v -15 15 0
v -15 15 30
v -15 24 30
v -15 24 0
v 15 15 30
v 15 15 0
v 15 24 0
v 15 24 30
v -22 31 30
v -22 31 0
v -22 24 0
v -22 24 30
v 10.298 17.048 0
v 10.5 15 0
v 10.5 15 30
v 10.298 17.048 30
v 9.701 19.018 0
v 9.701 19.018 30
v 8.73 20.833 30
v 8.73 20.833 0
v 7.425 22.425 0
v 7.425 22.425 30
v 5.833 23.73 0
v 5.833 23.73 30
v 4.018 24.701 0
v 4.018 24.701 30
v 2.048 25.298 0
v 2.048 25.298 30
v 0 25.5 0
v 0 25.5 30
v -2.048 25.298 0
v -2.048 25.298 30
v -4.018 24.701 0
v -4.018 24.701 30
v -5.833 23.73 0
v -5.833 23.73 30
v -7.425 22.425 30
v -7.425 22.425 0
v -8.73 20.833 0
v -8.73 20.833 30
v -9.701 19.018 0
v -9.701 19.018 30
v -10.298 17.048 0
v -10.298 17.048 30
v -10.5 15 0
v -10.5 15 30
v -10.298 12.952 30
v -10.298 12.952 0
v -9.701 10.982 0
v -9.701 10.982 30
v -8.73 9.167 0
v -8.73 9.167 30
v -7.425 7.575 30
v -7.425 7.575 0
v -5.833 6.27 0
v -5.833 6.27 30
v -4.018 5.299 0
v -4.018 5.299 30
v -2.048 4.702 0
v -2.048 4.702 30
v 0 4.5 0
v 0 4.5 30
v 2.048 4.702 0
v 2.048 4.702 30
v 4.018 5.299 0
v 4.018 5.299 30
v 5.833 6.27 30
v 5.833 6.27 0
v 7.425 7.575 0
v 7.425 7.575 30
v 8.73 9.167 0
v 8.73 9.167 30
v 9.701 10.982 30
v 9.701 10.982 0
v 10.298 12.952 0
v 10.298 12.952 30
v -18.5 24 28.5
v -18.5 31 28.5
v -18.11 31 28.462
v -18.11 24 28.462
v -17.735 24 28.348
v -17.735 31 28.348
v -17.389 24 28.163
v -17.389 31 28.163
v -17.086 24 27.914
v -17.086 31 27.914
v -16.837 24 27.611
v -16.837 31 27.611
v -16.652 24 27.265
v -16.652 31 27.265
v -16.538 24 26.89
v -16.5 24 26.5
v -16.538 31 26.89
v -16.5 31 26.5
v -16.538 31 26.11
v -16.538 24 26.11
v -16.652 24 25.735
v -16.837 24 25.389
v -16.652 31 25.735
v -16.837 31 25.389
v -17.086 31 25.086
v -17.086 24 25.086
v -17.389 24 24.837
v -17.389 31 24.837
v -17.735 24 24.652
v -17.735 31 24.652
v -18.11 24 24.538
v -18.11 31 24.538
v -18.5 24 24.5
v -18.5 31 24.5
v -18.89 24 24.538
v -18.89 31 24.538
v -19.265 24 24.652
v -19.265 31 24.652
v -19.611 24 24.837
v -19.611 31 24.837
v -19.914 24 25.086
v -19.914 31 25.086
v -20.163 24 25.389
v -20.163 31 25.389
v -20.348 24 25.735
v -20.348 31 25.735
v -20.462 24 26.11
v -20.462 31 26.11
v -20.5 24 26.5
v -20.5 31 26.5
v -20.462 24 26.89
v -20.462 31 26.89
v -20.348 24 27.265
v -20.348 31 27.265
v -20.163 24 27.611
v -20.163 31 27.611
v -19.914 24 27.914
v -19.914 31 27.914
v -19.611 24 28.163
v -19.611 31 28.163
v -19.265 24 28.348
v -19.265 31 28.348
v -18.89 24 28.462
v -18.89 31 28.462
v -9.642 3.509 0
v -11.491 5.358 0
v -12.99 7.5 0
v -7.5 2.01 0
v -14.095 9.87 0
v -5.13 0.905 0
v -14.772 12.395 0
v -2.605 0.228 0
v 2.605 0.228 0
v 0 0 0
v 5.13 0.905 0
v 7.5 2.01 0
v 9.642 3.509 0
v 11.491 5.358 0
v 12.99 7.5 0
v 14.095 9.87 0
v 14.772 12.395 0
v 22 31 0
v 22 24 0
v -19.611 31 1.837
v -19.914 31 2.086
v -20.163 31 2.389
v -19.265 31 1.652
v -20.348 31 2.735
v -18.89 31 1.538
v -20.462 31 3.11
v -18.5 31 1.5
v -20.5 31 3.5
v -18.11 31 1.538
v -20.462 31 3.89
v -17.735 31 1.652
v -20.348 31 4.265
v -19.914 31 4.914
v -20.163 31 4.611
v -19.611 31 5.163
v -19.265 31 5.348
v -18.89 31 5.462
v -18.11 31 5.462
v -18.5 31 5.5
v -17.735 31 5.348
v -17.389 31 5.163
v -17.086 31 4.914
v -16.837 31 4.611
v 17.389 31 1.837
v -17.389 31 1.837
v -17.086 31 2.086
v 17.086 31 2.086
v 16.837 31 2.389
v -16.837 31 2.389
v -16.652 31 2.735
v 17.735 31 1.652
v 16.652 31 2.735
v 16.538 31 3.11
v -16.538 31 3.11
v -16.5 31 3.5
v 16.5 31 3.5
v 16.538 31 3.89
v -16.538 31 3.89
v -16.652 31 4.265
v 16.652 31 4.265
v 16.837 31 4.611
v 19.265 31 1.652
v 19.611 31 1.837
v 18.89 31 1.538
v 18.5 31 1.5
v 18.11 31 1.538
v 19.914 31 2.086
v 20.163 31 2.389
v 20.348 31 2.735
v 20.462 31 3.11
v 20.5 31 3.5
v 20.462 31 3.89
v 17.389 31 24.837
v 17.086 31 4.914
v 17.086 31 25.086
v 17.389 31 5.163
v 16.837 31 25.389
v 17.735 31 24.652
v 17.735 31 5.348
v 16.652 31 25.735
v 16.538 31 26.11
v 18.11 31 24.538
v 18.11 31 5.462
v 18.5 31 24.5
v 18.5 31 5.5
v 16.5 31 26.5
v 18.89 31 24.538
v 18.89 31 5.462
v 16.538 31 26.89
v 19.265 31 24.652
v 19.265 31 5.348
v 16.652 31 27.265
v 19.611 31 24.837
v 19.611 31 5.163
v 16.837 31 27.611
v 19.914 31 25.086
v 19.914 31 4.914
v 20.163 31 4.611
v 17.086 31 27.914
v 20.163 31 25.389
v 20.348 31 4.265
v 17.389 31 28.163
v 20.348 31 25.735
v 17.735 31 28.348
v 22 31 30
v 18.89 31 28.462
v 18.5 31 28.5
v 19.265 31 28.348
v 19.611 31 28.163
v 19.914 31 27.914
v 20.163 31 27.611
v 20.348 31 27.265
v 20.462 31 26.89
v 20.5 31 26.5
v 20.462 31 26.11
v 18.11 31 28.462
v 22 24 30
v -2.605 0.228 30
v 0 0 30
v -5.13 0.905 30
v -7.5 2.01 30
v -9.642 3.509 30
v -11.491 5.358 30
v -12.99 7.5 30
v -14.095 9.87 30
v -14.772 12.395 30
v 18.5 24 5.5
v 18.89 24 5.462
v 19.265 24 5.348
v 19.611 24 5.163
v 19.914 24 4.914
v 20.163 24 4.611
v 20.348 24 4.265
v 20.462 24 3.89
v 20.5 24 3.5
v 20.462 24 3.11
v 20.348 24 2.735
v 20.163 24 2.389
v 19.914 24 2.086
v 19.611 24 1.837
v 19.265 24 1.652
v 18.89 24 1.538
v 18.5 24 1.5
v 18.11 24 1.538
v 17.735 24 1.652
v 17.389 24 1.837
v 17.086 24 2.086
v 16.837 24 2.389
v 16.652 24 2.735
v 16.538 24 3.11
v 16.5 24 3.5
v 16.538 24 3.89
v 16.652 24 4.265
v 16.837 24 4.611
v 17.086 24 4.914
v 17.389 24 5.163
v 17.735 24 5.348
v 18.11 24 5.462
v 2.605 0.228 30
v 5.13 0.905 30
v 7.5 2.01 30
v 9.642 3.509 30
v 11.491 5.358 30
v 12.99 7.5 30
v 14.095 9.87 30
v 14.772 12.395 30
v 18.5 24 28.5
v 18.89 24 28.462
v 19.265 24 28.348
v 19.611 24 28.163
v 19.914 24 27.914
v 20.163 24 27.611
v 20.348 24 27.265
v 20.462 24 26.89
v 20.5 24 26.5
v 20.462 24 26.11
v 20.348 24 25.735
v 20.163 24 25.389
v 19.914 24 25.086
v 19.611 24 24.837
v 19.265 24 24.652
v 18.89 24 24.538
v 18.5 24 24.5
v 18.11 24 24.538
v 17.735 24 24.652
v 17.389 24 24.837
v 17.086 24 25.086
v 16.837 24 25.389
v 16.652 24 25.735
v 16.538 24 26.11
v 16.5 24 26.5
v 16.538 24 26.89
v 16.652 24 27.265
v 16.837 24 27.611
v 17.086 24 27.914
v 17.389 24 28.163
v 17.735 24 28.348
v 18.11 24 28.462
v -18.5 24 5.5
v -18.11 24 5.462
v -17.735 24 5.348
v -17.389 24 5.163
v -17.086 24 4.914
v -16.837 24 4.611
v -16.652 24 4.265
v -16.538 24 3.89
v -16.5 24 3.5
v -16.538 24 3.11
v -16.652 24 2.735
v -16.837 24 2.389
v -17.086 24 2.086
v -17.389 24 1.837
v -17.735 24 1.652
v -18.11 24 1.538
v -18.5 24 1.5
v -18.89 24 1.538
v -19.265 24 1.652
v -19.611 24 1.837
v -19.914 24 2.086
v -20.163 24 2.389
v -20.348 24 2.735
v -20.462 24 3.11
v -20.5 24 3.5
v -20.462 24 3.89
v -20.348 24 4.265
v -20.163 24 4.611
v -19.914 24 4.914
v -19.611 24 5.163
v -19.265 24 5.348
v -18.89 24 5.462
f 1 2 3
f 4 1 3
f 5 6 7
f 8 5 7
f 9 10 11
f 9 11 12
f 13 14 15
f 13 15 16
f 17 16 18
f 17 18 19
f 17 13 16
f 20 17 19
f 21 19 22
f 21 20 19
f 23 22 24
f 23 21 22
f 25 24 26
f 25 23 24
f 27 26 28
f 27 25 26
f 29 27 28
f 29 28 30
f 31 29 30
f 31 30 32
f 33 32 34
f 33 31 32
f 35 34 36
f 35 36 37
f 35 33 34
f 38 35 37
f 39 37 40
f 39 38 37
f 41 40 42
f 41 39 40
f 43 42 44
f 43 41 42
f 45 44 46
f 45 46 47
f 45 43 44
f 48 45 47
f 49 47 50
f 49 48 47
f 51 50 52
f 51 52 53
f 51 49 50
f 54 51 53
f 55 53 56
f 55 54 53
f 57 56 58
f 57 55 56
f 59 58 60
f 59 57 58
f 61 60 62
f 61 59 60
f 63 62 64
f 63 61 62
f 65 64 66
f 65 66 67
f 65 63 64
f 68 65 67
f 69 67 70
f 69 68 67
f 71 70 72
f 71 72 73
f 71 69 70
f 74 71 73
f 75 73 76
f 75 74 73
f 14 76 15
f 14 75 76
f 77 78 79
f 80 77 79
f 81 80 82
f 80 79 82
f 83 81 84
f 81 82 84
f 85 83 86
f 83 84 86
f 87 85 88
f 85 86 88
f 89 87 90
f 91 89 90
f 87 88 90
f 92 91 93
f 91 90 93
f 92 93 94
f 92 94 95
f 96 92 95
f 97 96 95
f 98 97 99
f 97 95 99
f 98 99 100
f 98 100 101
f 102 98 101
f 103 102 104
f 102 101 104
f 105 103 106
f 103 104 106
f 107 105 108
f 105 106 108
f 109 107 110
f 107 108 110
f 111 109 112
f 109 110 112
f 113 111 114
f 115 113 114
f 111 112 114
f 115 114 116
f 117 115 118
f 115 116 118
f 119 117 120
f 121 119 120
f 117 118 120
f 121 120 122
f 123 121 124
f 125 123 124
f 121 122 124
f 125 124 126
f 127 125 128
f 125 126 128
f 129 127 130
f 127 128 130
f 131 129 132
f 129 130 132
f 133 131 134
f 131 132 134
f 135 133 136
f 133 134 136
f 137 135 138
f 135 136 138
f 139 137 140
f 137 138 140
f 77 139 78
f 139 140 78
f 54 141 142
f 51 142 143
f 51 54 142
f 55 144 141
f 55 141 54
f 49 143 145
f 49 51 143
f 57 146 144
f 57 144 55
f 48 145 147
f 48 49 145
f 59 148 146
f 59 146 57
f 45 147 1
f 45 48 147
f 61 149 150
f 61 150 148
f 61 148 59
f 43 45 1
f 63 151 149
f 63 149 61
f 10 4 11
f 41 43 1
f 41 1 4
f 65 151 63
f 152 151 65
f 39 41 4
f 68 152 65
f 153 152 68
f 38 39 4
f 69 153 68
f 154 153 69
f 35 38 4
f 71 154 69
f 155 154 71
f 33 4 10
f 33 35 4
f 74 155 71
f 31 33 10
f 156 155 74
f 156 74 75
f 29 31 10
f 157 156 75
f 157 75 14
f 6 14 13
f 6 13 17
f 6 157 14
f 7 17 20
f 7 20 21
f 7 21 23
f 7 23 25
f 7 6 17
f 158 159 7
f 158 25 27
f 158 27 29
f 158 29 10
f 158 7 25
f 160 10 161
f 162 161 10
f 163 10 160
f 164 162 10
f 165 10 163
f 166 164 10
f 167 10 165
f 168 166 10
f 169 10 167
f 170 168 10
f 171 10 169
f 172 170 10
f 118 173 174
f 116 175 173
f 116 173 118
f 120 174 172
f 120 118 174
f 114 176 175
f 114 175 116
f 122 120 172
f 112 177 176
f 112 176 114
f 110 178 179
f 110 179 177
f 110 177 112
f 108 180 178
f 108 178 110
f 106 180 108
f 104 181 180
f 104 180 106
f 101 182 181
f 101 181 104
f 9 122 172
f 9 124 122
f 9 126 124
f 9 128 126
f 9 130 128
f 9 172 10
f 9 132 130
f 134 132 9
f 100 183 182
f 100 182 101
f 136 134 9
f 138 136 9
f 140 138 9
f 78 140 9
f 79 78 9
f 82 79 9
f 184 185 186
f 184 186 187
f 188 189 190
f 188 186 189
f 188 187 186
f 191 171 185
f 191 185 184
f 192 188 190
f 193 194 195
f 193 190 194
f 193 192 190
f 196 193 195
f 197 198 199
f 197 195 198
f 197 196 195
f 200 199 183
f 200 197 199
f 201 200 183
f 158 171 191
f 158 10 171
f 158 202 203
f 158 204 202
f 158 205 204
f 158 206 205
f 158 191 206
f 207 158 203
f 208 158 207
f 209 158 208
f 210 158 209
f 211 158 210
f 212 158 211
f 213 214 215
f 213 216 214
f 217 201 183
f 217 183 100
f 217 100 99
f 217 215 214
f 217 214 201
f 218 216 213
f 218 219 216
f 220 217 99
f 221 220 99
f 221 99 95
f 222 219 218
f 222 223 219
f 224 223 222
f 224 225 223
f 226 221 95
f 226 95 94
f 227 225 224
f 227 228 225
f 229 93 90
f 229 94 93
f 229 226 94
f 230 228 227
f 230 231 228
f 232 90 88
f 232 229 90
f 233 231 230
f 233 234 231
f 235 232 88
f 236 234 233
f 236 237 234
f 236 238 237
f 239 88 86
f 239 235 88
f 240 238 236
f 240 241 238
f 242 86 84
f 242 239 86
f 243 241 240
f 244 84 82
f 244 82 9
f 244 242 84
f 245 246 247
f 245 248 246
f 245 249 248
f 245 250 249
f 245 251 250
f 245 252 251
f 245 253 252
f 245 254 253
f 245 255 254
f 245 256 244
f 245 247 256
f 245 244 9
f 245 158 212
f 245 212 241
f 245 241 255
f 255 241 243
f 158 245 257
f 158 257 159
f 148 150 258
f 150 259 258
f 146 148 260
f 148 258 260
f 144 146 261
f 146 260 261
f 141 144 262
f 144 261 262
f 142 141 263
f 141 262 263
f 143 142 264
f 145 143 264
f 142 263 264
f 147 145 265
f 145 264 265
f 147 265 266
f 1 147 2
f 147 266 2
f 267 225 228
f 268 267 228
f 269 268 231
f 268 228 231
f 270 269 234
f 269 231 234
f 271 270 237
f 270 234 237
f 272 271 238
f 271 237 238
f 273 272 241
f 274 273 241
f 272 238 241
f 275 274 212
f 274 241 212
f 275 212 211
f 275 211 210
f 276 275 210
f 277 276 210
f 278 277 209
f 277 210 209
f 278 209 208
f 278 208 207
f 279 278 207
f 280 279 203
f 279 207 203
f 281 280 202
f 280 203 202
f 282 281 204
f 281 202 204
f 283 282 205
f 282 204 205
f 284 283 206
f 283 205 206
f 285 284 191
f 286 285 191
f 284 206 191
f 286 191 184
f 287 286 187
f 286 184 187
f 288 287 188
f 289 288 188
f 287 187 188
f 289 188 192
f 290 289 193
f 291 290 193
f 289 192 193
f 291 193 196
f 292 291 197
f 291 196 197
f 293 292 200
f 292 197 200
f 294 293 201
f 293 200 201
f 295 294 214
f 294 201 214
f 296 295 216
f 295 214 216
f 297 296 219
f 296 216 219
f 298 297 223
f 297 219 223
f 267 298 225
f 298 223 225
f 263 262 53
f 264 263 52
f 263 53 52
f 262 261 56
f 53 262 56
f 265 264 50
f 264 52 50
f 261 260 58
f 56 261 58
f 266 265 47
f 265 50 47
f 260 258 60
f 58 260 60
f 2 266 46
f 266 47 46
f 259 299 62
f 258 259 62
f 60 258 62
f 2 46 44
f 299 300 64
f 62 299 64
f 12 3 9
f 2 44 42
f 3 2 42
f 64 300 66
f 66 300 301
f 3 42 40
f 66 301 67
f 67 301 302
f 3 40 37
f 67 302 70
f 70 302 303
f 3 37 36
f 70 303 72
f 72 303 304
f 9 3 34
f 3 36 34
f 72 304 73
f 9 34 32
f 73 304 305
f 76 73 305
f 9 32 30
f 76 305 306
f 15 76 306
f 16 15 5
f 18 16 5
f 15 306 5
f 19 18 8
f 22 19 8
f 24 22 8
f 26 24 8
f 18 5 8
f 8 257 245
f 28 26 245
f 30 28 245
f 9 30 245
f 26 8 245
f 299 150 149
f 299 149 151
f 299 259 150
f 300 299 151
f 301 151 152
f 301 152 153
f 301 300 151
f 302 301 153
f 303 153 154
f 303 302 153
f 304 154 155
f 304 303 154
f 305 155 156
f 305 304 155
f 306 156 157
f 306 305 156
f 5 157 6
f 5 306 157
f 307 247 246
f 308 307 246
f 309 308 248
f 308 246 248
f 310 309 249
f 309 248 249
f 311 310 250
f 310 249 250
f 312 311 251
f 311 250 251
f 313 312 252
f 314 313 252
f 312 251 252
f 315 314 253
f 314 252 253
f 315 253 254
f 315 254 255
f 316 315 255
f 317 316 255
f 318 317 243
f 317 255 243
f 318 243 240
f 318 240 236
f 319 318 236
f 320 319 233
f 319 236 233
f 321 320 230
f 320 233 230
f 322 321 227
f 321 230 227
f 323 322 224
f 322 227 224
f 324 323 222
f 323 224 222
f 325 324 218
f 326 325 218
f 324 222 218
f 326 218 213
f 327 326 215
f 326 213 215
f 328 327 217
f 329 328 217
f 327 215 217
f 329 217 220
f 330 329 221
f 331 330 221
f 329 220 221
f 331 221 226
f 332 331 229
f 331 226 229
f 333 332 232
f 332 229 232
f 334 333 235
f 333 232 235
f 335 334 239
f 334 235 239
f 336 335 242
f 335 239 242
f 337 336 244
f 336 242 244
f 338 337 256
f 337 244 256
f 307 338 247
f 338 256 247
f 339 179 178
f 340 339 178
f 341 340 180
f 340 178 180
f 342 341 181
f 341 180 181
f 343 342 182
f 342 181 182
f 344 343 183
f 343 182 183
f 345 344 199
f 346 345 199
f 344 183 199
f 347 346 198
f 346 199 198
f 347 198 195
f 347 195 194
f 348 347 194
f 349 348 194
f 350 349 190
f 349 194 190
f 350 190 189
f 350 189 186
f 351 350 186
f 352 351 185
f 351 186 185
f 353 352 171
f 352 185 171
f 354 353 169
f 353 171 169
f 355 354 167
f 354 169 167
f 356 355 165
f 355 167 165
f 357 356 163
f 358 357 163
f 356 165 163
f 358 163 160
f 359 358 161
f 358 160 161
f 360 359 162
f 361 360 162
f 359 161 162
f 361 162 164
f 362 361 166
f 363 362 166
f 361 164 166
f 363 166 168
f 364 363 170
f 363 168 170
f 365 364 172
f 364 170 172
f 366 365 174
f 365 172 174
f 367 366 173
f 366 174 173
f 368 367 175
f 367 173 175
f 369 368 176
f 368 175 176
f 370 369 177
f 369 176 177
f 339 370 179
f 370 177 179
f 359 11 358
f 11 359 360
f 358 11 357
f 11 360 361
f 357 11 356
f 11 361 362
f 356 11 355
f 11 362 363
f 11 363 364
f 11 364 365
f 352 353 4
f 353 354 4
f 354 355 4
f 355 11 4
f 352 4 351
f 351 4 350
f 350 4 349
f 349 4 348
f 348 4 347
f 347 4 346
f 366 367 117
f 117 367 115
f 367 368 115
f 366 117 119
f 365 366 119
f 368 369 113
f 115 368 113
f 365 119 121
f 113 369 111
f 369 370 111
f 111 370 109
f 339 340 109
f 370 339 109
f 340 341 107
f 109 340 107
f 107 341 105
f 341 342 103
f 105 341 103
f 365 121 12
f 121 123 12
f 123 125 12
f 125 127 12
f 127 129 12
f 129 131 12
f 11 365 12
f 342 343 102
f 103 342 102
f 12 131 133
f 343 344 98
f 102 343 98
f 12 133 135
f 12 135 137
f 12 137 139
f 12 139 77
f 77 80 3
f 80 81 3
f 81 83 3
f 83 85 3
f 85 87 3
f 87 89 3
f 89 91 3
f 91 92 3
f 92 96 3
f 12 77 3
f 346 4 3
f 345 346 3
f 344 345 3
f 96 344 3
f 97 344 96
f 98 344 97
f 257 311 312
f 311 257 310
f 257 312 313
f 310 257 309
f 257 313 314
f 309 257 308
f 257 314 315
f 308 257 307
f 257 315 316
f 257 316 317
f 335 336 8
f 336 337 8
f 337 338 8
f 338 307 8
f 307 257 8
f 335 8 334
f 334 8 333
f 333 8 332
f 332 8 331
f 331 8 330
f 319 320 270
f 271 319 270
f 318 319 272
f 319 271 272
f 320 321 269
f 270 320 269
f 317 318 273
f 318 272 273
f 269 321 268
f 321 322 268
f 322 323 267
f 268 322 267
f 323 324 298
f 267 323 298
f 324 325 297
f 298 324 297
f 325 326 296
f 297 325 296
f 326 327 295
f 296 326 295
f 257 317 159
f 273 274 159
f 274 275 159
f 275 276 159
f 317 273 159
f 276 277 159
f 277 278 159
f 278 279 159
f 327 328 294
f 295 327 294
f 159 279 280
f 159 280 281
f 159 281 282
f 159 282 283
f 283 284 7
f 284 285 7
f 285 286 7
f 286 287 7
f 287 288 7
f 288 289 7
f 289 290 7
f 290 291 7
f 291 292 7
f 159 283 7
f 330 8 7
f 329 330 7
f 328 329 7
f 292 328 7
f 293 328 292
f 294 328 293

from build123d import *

# Parameters (mm, degrees)
SKETCH_1_W          = 30
SKETCH_1_H          = 31
SKETCH_1_R          = 10.5
EXTRUDE_1_DEPTH     = 30
FILLET_1_R          = 15
FILLET_2_R          = 15
SKETCH_2_W          = 30
SKETCH_2_H          = 7
EXTRUDE_2_DEPTH     = 7
SKETCH_3_W          = 30
SKETCH_3_H          = 7
EXTRUDE_3_DEPTH     = 7
SKETCH_4_R          = 2
CUT_EXTRUDE_1_DEPTH = 7


with BuildPart() as part:
    # Эскиз1 → Бобышка-Вытянуть1 (new body)
    with BuildSketch(Plane.XY):
        with Locations((0, 15.5)):
            Rectangle(SKETCH_1_W, SKETCH_1_H)
        with Locations((0, 15)):
            Circle(SKETCH_1_R, mode=Mode.SUBTRACT)
    extrude(amount=EXTRUDE_1_DEPTH)

    # Скругление1
    fillet_1_edges = [part.edges().sort_by_distance(p)[0] for p in [
        (15, 0, 15),
    ]]
    fillet(fillet_1_edges, radius=FILLET_1_R)

    # Скругление2
    fillet_2_edges = [part.edges().sort_by_distance(p)[0] for p in [
        (-15, 0, 15),
    ]]
    fillet(fillet_2_edges, radius=FILLET_2_R - 0.0001)  # a hair under: the kernel refuses the full size

    # Эскиз2 → Бобышка-Вытянуть2 (add)
    with BuildSketch(Plane(origin=(15, 0, 0), x_dir=(0, 0, -1), z_dir=(1, 0, 0))):
        with Locations((-15, 27.5)):
            Rectangle(SKETCH_2_W, SKETCH_2_H)
    extrude(amount=EXTRUDE_2_DEPTH)

    # Эскиз3 → Бобышка-Вытянуть3 (add)
    with BuildSketch(Plane.ZY.offset(15)):
        with Locations((15, 27.5)):
            Rectangle(SKETCH_3_W, SKETCH_3_H)
    extrude(amount=EXTRUDE_3_DEPTH)

    # Эскиз4 → Вырез-Вытянуть1 (cut)
    with BuildSketch(Plane(origin=(0, 31, 0), x_dir=(1, 0, 0), z_dir=(0, 1, 0))):
        with Locations(Location((18.5, -3.5, 0), (0, 0, 270))):
            Circle(SKETCH_4_R)
        with Locations(Location((18.5, -26.5, 0), (0, 0, 270))):
            Circle(SKETCH_4_R)
        with Locations(Location((-18.5, -26.5, 0), (0, 0, 270))):
            Circle(SKETCH_4_R)
        with Locations(Location((-18.5, -3.5, 0), (0, 0, 270))):
            Circle(SKETCH_4_R)
    extrude(amount=-CUT_EXTRUDE_1_DEPTH, mode=Mode.SUBTRACT)


solid = part.part
